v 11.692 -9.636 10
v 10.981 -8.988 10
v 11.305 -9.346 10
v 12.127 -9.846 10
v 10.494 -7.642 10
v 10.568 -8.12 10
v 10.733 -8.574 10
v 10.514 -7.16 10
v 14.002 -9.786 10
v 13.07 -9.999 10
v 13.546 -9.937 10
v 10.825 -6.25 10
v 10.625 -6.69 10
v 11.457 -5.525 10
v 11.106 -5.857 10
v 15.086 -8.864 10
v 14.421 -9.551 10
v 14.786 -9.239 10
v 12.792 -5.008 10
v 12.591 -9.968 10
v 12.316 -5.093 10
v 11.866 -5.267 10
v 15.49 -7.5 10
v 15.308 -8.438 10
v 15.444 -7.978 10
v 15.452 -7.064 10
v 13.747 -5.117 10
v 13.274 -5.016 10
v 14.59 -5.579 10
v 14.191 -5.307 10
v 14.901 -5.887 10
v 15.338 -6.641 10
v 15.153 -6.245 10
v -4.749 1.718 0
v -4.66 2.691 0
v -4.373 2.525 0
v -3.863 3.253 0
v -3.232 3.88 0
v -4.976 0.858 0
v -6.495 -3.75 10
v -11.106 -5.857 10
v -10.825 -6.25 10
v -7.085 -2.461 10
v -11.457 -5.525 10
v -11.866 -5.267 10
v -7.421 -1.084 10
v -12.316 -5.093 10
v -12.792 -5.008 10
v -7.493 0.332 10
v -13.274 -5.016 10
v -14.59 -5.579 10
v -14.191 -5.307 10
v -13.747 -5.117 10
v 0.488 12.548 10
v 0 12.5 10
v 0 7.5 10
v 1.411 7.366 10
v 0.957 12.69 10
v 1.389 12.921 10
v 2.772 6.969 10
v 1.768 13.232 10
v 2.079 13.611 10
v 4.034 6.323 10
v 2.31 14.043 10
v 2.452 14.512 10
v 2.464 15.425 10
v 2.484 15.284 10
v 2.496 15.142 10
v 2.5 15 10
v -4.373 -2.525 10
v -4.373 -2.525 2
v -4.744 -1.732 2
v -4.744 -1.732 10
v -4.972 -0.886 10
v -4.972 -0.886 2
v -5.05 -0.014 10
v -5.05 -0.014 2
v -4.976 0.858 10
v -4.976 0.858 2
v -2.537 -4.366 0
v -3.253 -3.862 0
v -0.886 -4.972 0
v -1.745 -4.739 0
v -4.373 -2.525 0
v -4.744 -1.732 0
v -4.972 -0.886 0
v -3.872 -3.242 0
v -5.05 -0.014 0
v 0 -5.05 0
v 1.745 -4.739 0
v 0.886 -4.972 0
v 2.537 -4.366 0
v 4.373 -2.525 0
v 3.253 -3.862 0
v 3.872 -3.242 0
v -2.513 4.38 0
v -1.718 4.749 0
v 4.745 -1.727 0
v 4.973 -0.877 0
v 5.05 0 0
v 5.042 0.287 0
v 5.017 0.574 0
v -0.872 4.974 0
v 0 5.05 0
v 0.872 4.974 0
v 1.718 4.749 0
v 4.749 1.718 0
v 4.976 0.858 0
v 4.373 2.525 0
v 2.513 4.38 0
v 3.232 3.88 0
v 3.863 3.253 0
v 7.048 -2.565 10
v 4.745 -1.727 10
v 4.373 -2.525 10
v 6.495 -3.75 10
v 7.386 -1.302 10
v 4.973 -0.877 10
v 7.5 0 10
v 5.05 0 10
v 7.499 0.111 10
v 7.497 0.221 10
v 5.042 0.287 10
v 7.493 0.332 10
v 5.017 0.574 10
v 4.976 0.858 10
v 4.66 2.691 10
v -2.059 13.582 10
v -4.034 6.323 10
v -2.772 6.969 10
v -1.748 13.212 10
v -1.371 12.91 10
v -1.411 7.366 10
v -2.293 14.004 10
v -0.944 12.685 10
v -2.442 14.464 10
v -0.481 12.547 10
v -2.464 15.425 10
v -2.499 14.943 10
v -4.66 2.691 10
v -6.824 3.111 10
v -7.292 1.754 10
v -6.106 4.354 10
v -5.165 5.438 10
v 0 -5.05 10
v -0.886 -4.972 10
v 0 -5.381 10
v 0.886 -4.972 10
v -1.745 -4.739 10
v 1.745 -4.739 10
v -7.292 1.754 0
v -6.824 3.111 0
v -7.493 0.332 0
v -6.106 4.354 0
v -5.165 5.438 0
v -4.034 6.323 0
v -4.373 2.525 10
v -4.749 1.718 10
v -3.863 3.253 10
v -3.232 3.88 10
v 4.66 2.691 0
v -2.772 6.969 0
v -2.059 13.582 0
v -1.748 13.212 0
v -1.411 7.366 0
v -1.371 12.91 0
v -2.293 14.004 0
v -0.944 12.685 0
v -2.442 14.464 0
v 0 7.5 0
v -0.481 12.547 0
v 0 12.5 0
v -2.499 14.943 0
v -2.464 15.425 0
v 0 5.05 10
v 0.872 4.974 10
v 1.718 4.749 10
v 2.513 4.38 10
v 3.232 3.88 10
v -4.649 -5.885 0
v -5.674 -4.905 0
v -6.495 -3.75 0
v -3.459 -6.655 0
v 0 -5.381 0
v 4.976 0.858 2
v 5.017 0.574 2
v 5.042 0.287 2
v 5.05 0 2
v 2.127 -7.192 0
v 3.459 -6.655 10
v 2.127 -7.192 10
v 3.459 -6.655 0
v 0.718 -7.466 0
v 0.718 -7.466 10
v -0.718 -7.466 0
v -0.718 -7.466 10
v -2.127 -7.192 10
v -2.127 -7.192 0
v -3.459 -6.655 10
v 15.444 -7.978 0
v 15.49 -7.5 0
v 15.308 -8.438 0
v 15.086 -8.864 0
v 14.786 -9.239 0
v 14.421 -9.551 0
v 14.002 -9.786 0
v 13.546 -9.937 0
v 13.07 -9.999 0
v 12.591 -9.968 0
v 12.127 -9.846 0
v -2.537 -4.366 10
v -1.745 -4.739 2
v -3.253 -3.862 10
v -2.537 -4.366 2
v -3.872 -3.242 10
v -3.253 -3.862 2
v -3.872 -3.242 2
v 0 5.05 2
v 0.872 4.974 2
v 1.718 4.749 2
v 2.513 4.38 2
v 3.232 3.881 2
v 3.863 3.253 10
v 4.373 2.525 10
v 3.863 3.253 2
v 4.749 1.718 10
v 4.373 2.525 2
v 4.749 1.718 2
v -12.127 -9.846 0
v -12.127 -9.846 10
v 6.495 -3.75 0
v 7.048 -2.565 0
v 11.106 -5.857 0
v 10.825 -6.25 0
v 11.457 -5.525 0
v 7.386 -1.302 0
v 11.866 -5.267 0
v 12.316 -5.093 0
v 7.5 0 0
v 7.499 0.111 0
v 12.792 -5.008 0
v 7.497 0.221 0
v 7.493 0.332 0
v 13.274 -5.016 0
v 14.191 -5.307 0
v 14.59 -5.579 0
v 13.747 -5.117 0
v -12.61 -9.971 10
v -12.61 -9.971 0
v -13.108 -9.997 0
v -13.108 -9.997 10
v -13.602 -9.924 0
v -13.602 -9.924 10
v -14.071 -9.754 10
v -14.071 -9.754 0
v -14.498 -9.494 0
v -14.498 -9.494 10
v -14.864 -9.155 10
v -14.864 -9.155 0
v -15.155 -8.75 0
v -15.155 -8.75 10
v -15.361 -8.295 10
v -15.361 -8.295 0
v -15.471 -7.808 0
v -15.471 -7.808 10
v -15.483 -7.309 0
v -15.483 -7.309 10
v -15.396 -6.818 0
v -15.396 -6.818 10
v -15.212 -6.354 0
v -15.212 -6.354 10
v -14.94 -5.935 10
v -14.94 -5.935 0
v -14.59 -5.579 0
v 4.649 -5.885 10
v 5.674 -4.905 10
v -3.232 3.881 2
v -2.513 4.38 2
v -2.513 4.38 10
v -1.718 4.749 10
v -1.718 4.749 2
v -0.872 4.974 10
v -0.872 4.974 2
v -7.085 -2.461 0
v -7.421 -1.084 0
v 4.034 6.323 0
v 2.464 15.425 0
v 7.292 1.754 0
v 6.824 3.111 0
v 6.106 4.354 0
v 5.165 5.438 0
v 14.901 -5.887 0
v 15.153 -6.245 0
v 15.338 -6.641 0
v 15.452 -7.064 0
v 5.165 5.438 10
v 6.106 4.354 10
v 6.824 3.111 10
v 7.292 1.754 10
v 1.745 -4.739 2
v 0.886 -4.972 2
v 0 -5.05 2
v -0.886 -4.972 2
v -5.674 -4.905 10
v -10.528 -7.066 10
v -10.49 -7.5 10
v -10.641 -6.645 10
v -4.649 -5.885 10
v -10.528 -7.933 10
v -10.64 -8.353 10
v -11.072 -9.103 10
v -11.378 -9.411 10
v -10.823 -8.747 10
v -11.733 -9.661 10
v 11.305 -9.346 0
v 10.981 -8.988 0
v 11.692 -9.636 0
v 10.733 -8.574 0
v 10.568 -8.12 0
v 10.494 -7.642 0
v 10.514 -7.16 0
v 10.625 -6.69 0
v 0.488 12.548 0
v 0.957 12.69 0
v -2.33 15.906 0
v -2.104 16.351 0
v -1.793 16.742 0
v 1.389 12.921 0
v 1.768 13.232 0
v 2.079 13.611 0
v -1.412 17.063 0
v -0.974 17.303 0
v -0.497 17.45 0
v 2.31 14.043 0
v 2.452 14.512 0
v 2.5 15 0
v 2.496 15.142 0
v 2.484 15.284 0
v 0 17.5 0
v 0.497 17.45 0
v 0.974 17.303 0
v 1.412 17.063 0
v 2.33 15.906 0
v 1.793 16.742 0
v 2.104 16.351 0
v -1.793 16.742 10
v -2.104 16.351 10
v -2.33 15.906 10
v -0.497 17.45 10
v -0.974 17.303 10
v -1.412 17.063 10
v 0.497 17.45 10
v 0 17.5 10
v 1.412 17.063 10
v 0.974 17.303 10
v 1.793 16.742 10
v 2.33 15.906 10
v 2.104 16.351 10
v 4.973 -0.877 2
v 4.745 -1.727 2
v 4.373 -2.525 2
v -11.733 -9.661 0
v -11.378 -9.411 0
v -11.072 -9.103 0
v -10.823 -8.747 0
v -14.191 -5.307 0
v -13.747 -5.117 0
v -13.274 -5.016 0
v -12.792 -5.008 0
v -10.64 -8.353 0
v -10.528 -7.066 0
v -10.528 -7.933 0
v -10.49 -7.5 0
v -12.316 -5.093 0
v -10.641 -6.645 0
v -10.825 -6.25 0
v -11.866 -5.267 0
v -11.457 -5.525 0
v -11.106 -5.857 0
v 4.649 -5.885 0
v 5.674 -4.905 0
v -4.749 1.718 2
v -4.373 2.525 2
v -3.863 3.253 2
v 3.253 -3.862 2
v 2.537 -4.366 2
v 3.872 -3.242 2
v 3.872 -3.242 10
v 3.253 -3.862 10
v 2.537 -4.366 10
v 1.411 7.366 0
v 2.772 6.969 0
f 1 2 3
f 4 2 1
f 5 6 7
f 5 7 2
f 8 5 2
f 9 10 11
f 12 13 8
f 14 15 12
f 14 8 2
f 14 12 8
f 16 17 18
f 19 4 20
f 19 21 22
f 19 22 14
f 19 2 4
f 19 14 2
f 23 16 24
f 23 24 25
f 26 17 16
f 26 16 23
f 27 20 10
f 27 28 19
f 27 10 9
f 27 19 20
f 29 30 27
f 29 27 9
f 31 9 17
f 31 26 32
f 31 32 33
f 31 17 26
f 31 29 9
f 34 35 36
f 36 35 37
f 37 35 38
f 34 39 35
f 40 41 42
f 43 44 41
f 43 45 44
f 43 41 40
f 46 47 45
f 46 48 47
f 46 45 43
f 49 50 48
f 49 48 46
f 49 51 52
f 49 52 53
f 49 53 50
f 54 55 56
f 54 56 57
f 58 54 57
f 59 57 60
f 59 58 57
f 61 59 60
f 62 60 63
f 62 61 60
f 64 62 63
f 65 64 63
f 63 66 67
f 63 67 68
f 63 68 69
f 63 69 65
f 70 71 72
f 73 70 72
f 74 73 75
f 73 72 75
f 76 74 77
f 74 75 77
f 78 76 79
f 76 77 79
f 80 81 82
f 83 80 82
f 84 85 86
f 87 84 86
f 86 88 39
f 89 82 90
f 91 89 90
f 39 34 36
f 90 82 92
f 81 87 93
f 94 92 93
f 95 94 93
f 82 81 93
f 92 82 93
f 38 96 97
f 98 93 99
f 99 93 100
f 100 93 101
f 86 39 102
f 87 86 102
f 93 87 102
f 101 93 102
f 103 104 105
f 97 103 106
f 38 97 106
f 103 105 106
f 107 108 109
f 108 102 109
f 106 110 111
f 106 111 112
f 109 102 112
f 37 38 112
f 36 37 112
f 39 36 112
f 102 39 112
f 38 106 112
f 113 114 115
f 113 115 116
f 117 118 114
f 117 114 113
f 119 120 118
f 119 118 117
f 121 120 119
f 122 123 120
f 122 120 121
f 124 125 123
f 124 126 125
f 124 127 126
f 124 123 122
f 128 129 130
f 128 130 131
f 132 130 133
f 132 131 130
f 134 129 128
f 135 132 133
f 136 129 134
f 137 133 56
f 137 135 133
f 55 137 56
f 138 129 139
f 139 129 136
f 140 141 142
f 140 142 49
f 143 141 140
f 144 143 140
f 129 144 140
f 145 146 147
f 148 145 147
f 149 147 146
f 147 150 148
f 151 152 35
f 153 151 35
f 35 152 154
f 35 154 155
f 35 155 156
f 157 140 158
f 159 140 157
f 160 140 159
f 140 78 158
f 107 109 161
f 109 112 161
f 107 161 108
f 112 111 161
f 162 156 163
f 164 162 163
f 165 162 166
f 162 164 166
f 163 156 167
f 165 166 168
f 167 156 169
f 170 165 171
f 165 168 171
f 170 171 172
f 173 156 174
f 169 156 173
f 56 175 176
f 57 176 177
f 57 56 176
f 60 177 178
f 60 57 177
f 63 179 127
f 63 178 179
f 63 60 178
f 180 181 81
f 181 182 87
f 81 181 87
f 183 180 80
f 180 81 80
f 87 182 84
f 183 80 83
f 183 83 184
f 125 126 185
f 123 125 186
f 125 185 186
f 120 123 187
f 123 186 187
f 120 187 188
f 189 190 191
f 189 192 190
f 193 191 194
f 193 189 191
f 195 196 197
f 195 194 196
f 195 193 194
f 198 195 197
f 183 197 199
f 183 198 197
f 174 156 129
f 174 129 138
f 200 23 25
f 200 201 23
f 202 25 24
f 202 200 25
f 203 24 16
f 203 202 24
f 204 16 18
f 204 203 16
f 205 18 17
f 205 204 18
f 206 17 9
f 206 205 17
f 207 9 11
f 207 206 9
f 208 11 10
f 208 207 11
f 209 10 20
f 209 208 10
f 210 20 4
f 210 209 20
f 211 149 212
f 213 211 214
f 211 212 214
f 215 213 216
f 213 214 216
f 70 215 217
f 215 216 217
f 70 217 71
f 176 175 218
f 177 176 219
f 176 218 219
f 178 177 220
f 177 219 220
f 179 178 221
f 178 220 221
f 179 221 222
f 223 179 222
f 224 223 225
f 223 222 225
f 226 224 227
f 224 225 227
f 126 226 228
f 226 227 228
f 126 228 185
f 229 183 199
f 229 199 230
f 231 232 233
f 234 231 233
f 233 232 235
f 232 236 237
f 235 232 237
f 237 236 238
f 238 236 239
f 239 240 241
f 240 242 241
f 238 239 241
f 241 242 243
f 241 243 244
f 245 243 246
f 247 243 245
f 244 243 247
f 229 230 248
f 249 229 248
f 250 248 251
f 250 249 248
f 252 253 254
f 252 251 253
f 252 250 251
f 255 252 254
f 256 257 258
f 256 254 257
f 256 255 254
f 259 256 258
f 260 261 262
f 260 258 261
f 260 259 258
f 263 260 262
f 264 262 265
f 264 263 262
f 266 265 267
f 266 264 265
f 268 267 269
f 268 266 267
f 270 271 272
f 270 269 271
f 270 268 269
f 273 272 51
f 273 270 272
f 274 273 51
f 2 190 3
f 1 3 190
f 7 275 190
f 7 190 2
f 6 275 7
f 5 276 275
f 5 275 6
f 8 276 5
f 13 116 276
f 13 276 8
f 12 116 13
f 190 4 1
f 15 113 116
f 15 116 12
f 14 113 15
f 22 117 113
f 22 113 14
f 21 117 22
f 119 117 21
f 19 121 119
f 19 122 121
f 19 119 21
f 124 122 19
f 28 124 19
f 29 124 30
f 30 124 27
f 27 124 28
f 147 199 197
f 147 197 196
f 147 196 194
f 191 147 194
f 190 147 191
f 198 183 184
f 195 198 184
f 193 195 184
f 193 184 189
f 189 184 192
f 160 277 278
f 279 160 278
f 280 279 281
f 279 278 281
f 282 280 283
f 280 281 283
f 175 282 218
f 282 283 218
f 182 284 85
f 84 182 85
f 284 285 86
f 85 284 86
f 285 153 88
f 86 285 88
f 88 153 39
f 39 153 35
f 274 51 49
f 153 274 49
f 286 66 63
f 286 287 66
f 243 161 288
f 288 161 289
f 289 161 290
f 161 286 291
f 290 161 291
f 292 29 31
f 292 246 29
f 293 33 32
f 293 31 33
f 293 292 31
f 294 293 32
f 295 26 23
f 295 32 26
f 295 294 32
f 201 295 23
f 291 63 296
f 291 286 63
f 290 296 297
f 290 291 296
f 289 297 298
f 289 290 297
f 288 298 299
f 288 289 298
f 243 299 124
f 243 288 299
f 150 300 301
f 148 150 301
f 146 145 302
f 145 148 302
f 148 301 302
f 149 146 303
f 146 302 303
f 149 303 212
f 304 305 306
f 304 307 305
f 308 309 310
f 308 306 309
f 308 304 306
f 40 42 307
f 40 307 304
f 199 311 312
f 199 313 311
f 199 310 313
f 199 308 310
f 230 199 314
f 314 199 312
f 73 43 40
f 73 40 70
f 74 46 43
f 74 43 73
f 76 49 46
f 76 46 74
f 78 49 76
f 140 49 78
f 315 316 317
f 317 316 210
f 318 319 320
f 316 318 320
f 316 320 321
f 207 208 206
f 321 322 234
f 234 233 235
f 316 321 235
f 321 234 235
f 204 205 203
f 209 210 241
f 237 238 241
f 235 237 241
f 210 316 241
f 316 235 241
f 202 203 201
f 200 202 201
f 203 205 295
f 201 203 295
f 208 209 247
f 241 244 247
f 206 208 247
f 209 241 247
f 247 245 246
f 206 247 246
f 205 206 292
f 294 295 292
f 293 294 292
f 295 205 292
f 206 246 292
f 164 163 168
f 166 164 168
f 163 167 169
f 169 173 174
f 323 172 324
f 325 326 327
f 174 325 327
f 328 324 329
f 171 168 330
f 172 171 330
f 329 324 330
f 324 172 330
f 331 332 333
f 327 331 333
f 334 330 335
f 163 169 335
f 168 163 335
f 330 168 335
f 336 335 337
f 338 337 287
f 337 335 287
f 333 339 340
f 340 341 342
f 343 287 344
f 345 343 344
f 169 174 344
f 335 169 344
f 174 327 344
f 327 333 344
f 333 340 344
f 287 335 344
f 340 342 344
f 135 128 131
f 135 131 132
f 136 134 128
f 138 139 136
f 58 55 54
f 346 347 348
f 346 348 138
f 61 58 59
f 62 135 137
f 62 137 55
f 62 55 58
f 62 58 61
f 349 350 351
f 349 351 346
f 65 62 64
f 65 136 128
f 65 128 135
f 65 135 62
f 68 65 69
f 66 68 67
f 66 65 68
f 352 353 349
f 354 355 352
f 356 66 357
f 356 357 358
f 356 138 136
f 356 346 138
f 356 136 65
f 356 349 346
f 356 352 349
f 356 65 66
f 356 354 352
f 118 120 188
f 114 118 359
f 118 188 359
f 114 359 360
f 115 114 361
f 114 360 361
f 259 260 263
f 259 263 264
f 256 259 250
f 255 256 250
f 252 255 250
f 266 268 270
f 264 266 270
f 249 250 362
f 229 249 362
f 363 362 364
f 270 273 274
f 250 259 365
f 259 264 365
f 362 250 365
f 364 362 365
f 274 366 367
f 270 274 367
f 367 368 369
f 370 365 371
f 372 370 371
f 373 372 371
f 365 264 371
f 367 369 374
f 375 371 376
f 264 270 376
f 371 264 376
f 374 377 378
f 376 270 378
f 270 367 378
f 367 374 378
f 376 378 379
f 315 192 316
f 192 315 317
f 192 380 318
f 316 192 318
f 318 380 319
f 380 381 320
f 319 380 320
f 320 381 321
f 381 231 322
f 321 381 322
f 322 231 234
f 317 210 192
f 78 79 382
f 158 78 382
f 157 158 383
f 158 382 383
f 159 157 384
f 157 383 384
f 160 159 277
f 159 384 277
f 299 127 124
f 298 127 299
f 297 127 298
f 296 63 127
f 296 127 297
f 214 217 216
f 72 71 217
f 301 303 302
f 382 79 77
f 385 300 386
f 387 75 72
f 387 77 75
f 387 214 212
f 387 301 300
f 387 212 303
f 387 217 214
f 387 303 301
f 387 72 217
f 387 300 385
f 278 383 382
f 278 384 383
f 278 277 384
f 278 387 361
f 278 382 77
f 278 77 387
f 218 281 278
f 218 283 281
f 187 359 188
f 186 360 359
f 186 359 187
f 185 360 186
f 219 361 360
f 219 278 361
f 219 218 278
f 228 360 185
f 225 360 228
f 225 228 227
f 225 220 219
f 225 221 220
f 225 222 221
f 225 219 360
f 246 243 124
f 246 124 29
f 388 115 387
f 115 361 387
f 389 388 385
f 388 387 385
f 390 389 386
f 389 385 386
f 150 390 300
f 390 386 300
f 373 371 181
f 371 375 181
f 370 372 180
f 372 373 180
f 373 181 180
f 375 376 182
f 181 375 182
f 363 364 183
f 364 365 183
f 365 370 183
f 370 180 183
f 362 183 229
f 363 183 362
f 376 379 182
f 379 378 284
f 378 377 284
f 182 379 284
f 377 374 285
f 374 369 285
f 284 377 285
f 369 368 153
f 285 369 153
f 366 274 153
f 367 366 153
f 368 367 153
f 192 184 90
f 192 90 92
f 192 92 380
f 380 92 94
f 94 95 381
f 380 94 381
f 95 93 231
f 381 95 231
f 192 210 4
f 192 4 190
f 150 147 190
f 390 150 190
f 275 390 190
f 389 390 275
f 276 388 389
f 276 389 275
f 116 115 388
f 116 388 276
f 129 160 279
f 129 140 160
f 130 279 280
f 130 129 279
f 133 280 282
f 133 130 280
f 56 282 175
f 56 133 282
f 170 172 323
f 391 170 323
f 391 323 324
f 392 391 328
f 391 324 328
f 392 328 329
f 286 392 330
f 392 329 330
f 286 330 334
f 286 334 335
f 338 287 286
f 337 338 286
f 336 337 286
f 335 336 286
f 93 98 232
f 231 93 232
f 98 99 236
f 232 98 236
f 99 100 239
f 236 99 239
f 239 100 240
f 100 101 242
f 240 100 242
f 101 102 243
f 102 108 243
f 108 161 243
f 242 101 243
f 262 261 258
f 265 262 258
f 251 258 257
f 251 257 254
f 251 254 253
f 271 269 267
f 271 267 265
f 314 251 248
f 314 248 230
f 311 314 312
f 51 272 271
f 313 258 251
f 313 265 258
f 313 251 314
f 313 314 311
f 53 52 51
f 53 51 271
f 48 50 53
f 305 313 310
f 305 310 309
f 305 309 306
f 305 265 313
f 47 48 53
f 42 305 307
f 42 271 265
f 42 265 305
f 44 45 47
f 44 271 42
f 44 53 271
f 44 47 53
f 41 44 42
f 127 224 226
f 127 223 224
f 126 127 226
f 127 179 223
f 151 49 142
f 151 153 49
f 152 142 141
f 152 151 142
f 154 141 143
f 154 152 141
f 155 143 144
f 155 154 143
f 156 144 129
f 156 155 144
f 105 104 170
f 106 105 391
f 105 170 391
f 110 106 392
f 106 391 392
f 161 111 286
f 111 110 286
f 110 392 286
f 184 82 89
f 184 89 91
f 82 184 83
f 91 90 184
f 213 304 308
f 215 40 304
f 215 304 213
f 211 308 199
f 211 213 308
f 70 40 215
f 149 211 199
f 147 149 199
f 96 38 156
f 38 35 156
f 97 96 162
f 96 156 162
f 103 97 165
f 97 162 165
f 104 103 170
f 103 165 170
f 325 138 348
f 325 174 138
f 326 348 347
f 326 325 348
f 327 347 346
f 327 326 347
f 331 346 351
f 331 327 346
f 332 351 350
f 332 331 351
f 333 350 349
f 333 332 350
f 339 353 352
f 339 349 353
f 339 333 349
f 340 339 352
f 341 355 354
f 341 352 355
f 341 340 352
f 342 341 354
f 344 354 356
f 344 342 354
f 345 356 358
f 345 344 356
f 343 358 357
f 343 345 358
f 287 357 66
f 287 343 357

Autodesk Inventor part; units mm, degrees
ref_plane "YZ Plane" through (0, 0, 0) normal (1, 0, 0) x (0, 1, 0)
ref_plane "XZ Plane" through (0, 0, 0) normal (0, 1, 0) x (-1, 0, 0)
ref_plane "XY Plane" through (0, 0, 0) normal (0, 0, 1) x (1, 0, 0)
sketch "Sketch1" plane through (0, 0, 0) normal (0, 0, 1) x (1, 0, 0)
  circle A0 centre (0, 0) radius 5.05
  circle A1 centre (0, 0) radius 15 construction
  line L0 (0, 0) -> (0, 15)
  circle A2 centre (0, 15) radius 2.5
  line L1 (2.4636, 15.425) -> (4.9765, 0.8585)
  line L2 (-4.9765, 0.8585) -> (-2.4636, 15.425)
  line L3 (0, 0) -> (-12.9904, -7.5)
  circle A3 centre (-12.9904, -7.5) radius 2.5
  line L4 (-14.5902, -5.579) -> (-3.2317, 3.8805)
  line L5 (1.7448, -4.739) -> (-12.1266, -9.846)
  line L6 (0, 0) -> (12.9904, -7.5)
  circle A4 centre (12.9904, -7.5) radius 2.5
  line L7 (12.1266, -9.846) -> (-1.7448, -4.739)
  line L8 (3.2317, 3.8805) -> (14.5902, -5.579)
  circle A5 centre (0, 0) radius 7.5
  point P0 (0, -15)
  point P1 (12.9904, 7.5)
  point P2 (-12.9904, 7.5)
  point P3 (-4.0338, 6.3228)
  point P4 (-3.4588, -6.6548)
  point P5 (3.4588, -6.6548)
  point P6 (4.0338, 6.3228)
  point P7 (7.4926, 0.332)
  point P8 (4.6604, 2.6907)
  point P9 (-7.4926, 0.332)
  point P10 (-4.6604, 2.6907)
  point P11 (0, -5.3814)
  dimension "d0" = 10.1
  dimension "d1" = 30
  dimension "d2" = 5
  dimension "d5" = 360
  dimension "d7" = 15
extrude "Extrusion1" add sketch "Sketch1" along normal blind 10 contours A0 L1 L8 A5 L6 | A0 L8 L1 | L6 A5 L7 L5 A0 | A0 L0 A5 L1 L8 | L1 A5 L8 | L5 L7 A0 | A5 L8 A4 L6 | L6 A4 L7 A5 | A0 L4 L2 A5 L0 | A5 L0 A2 L1 | L7 L5 A5 L3 A0 | L7 A5 L5 | L3 A5 L4 L2 A0 | A4 | A0 L2 L4 | A5 L2 A2 L0 | A2 | L5 A3 L3 A5 | L3 A3 L4 A5 | L4 A5 L2 | A3
extrude "Extrusion2" add sketch "Sketch1" along normal blind 2 contours A0 L6 L0 | A0 L3 L6 | L3 A0 L0
properties part number "Turret_Holder"
